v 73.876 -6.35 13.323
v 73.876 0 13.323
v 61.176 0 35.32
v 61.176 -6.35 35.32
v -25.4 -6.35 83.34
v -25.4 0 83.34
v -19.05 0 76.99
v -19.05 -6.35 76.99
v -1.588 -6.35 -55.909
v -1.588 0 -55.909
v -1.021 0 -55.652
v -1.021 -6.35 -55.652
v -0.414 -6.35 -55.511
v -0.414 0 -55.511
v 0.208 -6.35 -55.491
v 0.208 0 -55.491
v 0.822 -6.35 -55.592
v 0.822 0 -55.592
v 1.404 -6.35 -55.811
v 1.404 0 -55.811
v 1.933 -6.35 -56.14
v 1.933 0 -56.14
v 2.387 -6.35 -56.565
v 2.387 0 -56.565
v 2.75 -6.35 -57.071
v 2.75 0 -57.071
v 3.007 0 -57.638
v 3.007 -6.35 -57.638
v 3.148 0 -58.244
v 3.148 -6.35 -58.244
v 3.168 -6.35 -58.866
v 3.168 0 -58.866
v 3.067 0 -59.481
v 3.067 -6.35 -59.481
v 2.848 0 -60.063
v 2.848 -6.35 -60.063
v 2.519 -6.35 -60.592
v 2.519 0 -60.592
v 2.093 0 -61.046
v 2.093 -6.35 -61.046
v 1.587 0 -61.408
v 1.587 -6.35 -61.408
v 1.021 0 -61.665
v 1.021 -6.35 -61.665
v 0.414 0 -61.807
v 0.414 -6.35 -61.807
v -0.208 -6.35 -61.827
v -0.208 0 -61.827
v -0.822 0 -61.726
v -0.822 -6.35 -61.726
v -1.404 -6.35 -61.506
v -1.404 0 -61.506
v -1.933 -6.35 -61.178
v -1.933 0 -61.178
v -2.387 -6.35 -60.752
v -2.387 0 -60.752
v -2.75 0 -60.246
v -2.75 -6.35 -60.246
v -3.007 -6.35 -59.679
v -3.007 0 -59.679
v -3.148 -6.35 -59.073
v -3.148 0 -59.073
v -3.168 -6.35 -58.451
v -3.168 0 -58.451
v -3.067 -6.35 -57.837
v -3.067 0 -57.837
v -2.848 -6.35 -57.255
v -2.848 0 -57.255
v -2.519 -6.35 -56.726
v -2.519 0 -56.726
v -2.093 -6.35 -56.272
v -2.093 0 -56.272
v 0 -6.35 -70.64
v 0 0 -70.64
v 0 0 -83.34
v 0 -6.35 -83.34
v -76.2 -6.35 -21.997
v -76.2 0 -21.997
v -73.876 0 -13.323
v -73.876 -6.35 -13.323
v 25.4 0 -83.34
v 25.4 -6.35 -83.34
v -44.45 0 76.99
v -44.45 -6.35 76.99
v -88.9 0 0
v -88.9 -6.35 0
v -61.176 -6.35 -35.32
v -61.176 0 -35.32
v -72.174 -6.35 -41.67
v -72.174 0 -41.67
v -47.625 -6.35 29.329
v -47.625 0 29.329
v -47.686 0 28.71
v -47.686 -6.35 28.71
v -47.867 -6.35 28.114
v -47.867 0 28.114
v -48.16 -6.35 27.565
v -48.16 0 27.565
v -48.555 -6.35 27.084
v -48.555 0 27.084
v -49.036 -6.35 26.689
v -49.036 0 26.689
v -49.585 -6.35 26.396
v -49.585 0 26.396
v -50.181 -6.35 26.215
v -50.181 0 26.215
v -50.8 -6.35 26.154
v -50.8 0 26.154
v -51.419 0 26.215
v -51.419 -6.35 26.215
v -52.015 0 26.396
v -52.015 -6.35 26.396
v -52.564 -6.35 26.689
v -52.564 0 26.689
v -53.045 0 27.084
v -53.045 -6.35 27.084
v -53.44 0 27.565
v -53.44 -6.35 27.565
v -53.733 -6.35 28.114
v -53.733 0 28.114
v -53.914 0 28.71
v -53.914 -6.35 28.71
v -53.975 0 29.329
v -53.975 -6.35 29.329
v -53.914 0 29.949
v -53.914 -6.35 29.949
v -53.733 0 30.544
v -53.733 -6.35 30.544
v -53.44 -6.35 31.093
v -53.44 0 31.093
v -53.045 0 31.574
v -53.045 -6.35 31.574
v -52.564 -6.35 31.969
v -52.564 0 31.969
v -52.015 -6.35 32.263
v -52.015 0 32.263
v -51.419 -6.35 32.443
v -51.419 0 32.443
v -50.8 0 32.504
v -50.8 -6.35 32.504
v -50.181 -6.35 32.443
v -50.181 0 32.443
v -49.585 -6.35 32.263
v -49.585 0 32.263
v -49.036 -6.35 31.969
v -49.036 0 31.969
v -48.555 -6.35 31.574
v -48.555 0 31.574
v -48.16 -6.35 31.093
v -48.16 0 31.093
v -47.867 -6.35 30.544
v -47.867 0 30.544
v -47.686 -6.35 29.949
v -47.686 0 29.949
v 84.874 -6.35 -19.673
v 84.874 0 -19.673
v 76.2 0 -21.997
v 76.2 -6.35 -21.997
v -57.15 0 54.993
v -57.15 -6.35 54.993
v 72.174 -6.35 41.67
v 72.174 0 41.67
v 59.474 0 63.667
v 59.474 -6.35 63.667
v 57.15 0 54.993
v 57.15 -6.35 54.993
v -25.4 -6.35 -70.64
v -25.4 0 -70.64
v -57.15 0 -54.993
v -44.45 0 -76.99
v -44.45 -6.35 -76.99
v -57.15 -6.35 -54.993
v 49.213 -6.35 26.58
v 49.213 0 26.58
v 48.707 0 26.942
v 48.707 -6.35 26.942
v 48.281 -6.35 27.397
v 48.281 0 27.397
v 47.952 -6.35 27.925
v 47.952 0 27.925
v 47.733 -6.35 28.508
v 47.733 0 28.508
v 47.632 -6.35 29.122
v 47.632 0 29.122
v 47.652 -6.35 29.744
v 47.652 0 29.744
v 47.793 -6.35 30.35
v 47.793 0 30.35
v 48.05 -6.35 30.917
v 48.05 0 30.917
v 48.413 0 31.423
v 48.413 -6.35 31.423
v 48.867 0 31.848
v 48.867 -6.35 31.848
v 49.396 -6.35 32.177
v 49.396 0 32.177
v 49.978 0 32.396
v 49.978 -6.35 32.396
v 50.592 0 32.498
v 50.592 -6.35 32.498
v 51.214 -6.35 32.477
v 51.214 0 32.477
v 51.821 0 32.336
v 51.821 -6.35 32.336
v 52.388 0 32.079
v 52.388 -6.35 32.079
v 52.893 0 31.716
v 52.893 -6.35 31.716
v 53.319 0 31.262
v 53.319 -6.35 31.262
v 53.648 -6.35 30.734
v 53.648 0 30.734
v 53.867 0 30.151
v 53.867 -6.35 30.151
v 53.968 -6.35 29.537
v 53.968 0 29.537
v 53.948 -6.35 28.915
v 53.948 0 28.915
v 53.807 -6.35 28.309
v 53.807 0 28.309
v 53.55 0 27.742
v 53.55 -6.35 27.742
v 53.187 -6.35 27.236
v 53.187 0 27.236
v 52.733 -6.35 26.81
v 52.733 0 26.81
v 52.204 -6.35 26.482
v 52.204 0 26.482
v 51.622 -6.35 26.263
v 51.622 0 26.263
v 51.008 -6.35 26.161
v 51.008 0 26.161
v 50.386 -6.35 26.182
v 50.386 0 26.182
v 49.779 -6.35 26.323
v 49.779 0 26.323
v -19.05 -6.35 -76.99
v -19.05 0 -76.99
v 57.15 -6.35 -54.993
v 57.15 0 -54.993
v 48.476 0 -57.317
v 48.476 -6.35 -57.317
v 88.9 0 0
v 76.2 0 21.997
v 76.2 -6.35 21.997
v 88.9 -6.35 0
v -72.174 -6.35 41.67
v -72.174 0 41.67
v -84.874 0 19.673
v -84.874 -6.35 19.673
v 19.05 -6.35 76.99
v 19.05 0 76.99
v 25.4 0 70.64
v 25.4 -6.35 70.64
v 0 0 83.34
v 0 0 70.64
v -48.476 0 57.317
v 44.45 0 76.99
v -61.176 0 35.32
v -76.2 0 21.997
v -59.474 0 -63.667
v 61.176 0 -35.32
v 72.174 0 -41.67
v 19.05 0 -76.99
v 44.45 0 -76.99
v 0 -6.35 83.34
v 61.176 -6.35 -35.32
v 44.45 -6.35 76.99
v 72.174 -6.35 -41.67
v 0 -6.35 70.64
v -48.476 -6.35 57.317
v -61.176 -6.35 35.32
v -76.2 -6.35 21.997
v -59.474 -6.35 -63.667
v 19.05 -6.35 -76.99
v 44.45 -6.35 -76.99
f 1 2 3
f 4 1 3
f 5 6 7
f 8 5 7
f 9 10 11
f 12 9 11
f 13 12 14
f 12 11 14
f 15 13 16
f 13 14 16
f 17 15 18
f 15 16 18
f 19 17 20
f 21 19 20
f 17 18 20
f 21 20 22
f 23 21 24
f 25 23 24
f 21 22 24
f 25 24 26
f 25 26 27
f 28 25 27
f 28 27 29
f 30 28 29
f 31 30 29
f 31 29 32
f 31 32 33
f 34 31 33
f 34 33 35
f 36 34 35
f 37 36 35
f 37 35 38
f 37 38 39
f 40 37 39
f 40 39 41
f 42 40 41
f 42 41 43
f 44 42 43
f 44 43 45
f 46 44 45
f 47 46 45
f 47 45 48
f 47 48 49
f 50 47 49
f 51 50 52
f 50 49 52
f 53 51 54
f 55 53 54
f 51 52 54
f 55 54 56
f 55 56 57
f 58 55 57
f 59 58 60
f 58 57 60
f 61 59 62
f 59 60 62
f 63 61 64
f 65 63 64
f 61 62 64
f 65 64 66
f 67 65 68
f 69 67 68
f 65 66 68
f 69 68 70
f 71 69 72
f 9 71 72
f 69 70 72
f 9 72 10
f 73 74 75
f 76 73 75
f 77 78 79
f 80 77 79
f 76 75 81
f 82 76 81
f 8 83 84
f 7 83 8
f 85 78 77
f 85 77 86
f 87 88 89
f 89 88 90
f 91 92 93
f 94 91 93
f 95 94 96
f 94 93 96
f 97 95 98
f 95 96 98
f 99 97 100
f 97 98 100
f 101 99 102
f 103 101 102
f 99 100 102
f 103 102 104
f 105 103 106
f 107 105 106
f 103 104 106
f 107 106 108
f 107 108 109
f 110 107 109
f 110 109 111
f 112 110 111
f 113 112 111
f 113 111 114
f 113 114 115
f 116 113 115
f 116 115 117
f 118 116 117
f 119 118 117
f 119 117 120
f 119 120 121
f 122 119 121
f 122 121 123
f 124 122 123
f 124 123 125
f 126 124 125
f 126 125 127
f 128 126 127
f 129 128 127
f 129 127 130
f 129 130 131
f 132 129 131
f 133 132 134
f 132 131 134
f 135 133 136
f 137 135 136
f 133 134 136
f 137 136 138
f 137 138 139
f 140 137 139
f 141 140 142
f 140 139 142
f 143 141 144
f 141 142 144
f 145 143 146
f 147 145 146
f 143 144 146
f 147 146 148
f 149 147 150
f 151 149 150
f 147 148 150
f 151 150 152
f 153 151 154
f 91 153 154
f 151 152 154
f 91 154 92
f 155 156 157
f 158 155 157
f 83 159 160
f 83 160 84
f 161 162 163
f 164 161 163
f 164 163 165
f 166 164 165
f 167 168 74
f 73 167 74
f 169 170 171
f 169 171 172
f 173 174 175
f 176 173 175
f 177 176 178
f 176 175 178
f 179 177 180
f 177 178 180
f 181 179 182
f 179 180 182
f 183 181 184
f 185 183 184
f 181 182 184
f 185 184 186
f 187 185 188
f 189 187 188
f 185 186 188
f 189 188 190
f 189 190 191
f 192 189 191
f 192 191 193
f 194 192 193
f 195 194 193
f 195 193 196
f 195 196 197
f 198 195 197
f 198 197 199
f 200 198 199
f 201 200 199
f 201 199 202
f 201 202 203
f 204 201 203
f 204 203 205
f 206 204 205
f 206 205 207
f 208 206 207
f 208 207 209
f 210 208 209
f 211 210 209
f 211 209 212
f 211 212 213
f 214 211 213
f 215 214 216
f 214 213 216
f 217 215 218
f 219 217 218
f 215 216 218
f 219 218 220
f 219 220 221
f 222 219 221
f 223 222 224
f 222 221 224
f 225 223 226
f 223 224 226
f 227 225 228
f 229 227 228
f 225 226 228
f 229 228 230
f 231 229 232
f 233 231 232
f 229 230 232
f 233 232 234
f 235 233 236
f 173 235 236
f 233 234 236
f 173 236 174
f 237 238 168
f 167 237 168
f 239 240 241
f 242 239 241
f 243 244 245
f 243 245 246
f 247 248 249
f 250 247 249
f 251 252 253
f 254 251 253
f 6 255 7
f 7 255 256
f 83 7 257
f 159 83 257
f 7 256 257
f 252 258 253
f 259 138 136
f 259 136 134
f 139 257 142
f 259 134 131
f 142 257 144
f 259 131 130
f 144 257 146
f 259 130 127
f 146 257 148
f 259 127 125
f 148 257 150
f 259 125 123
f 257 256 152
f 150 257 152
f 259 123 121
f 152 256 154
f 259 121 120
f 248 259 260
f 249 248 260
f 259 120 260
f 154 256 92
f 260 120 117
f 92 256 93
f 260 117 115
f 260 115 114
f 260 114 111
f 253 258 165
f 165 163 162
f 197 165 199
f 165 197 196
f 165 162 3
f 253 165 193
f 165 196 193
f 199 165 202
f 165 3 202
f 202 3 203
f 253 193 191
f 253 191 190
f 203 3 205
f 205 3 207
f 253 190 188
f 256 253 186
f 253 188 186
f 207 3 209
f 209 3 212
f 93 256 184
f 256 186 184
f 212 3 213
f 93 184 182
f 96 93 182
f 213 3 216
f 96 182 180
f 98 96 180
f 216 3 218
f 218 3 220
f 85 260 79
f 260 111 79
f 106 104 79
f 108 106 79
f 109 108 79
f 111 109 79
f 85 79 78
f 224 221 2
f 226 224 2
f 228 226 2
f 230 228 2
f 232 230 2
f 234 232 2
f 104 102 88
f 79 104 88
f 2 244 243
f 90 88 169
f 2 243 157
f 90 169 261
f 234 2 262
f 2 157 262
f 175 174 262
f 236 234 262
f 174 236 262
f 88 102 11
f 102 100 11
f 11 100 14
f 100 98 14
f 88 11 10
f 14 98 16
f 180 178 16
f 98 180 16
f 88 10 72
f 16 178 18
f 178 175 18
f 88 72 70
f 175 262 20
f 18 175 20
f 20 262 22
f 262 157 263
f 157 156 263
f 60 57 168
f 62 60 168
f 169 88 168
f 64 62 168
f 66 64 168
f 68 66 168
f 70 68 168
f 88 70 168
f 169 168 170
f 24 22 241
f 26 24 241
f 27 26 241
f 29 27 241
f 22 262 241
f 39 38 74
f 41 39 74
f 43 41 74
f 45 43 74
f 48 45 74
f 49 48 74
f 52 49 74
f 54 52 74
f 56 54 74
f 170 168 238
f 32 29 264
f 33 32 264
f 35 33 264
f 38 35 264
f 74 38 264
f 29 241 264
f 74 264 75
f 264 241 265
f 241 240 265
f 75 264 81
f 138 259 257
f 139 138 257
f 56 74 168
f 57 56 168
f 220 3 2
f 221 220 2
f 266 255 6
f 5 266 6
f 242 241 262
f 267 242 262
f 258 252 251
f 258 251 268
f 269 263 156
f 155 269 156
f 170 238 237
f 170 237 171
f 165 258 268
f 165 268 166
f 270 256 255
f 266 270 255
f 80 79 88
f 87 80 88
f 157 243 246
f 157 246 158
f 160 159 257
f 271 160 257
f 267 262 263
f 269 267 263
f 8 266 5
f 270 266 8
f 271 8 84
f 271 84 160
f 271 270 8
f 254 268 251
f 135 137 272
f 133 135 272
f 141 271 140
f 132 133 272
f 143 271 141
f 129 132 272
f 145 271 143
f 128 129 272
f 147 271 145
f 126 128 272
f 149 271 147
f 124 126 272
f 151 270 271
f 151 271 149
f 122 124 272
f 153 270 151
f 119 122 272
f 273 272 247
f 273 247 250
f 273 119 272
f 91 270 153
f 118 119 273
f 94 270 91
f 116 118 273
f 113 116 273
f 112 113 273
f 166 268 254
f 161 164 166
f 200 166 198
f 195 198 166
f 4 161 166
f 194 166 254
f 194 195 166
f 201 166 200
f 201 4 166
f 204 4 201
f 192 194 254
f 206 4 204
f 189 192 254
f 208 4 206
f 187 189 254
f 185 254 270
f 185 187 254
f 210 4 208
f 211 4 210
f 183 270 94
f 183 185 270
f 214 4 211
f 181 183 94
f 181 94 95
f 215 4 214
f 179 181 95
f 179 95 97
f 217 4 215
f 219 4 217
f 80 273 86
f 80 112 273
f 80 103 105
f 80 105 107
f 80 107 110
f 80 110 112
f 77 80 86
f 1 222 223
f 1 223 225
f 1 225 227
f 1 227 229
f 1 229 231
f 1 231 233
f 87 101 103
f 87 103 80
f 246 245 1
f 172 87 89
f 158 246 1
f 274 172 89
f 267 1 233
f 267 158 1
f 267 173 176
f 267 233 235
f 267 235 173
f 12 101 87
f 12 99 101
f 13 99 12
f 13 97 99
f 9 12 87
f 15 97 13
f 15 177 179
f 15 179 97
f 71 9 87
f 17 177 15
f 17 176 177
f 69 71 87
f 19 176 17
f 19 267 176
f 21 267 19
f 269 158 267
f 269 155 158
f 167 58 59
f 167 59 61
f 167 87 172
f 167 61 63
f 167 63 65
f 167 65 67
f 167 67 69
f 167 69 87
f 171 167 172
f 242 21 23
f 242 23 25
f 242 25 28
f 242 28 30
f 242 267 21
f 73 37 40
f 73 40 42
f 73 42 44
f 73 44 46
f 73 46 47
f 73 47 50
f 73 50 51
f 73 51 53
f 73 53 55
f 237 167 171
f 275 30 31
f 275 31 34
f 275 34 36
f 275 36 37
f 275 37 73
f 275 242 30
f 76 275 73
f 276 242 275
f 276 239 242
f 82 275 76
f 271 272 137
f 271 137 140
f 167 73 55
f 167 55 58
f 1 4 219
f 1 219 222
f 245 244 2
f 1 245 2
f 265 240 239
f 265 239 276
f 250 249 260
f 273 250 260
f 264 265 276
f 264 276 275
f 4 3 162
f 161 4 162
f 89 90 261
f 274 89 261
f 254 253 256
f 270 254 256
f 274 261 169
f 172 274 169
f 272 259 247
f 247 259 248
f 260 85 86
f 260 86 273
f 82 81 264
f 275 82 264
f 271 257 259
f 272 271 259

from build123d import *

# Parameters (mm, degrees)
BOSS_EXTRUDE1_DEPTH = 6.35
SKETCH9_R           = 3.175
CUT_EXTRUDE3_DEPTH  = 118.774954893
CIRPATTERN6_COUNT   = 3
CUT_EXTRUDE4_DEPTH  = 118.774954893
BOSS_EXTRUDE4_DEPTH = 6.35
CIRPATTERN7_COUNT   = 6


with BuildPart() as part:
    # Sketch1 → Boss-Extrude1 (new body)
    with BuildSketch(Plane(origin=(0, 0, 0), x_dir=(1, 0, 0), z_dir=(0, 1, 0))):
        Polygon((88.9, 0), (44.45, 76.989658396), (-44.45, 76.989658396), (-88.9, 0), (-44.45, -76.989658396), (44.45, -76.989658396), align=None)
    extrude(amount=-BOSS_EXTRUDE1_DEPTH)

    # Sketch9 → Cut-Extrude3 (cut, through all)
    with BuildSketch(Plane(origin=(0, 0, 0), x_dir=(1, 0, 0), z_dir=(0, 1, 0))):
        with Locations((-50.8, -29.329393675)):
            Circle(SKETCH9_R)
    cut_extrude3 = extrude(amount=-CUT_EXTRUDE3_DEPTH, mode=Mode.SUBTRACT)

    # CirPattern6: Cut-Extrude3 ×3 about axis
    cirpattern6_axis = Axis((0, 0, 0), (0, 1, 0))
    for i in range(1, CIRPATTERN6_COUNT):
        add(cut_extrude3.rotate(cirpattern6_axis, i * 360 / CIRPATTERN6_COUNT), mode=Mode.SUBTRACT)

    # Sketch10 → Cut-Extrude4 (cut, through all)
    with BuildSketch(Plane(origin=(0, 0, 0), x_dir=(1, 0, 0), z_dir=(0, 1, 0))):
        Polygon((57.15, 54.99261314), (48.475738686, 57.316874454), (61.175738686, 35.319829198), (66.675, 38.494829198), align=None)
    cut_extrude4 = extrude(amount=-CUT_EXTRUDE4_DEPTH, mode=Mode.SUBTRACT)

    # Sketch11 → Boss-Extrude4 (add)
    with BuildSketch(Plane(origin=(0, 0, 0), x_dir=(1, 0, 0), z_dir=(0, 1, 0))):
        Polygon((66.675, 38.494829198), (72.174261314, 41.669829198), (84.874261314, 19.672783942), (76.2, 21.997045256), align=None)
    boss_extrude4 = extrude(amount=-BOSS_EXTRUDE4_DEPTH)

    # CirPattern7: Cut-Extrude4, Boss-Extrude4 ×6 about axis
    cirpattern7_axis = Axis((0, 0, 0), (0, 1, 0))
    add([cut_extrude4.rotate(cirpattern7_axis, i * 360 / CIRPATTERN7_COUNT) for i in range(1, CIRPATTERN7_COUNT)], mode=Mode.SUBTRACT)
    add([boss_extrude4.rotate(cirpattern7_axis, i * 360 / CIRPATTERN7_COUNT) for i in range(1, CIRPATTERN7_COUNT)])


solid = part.part
